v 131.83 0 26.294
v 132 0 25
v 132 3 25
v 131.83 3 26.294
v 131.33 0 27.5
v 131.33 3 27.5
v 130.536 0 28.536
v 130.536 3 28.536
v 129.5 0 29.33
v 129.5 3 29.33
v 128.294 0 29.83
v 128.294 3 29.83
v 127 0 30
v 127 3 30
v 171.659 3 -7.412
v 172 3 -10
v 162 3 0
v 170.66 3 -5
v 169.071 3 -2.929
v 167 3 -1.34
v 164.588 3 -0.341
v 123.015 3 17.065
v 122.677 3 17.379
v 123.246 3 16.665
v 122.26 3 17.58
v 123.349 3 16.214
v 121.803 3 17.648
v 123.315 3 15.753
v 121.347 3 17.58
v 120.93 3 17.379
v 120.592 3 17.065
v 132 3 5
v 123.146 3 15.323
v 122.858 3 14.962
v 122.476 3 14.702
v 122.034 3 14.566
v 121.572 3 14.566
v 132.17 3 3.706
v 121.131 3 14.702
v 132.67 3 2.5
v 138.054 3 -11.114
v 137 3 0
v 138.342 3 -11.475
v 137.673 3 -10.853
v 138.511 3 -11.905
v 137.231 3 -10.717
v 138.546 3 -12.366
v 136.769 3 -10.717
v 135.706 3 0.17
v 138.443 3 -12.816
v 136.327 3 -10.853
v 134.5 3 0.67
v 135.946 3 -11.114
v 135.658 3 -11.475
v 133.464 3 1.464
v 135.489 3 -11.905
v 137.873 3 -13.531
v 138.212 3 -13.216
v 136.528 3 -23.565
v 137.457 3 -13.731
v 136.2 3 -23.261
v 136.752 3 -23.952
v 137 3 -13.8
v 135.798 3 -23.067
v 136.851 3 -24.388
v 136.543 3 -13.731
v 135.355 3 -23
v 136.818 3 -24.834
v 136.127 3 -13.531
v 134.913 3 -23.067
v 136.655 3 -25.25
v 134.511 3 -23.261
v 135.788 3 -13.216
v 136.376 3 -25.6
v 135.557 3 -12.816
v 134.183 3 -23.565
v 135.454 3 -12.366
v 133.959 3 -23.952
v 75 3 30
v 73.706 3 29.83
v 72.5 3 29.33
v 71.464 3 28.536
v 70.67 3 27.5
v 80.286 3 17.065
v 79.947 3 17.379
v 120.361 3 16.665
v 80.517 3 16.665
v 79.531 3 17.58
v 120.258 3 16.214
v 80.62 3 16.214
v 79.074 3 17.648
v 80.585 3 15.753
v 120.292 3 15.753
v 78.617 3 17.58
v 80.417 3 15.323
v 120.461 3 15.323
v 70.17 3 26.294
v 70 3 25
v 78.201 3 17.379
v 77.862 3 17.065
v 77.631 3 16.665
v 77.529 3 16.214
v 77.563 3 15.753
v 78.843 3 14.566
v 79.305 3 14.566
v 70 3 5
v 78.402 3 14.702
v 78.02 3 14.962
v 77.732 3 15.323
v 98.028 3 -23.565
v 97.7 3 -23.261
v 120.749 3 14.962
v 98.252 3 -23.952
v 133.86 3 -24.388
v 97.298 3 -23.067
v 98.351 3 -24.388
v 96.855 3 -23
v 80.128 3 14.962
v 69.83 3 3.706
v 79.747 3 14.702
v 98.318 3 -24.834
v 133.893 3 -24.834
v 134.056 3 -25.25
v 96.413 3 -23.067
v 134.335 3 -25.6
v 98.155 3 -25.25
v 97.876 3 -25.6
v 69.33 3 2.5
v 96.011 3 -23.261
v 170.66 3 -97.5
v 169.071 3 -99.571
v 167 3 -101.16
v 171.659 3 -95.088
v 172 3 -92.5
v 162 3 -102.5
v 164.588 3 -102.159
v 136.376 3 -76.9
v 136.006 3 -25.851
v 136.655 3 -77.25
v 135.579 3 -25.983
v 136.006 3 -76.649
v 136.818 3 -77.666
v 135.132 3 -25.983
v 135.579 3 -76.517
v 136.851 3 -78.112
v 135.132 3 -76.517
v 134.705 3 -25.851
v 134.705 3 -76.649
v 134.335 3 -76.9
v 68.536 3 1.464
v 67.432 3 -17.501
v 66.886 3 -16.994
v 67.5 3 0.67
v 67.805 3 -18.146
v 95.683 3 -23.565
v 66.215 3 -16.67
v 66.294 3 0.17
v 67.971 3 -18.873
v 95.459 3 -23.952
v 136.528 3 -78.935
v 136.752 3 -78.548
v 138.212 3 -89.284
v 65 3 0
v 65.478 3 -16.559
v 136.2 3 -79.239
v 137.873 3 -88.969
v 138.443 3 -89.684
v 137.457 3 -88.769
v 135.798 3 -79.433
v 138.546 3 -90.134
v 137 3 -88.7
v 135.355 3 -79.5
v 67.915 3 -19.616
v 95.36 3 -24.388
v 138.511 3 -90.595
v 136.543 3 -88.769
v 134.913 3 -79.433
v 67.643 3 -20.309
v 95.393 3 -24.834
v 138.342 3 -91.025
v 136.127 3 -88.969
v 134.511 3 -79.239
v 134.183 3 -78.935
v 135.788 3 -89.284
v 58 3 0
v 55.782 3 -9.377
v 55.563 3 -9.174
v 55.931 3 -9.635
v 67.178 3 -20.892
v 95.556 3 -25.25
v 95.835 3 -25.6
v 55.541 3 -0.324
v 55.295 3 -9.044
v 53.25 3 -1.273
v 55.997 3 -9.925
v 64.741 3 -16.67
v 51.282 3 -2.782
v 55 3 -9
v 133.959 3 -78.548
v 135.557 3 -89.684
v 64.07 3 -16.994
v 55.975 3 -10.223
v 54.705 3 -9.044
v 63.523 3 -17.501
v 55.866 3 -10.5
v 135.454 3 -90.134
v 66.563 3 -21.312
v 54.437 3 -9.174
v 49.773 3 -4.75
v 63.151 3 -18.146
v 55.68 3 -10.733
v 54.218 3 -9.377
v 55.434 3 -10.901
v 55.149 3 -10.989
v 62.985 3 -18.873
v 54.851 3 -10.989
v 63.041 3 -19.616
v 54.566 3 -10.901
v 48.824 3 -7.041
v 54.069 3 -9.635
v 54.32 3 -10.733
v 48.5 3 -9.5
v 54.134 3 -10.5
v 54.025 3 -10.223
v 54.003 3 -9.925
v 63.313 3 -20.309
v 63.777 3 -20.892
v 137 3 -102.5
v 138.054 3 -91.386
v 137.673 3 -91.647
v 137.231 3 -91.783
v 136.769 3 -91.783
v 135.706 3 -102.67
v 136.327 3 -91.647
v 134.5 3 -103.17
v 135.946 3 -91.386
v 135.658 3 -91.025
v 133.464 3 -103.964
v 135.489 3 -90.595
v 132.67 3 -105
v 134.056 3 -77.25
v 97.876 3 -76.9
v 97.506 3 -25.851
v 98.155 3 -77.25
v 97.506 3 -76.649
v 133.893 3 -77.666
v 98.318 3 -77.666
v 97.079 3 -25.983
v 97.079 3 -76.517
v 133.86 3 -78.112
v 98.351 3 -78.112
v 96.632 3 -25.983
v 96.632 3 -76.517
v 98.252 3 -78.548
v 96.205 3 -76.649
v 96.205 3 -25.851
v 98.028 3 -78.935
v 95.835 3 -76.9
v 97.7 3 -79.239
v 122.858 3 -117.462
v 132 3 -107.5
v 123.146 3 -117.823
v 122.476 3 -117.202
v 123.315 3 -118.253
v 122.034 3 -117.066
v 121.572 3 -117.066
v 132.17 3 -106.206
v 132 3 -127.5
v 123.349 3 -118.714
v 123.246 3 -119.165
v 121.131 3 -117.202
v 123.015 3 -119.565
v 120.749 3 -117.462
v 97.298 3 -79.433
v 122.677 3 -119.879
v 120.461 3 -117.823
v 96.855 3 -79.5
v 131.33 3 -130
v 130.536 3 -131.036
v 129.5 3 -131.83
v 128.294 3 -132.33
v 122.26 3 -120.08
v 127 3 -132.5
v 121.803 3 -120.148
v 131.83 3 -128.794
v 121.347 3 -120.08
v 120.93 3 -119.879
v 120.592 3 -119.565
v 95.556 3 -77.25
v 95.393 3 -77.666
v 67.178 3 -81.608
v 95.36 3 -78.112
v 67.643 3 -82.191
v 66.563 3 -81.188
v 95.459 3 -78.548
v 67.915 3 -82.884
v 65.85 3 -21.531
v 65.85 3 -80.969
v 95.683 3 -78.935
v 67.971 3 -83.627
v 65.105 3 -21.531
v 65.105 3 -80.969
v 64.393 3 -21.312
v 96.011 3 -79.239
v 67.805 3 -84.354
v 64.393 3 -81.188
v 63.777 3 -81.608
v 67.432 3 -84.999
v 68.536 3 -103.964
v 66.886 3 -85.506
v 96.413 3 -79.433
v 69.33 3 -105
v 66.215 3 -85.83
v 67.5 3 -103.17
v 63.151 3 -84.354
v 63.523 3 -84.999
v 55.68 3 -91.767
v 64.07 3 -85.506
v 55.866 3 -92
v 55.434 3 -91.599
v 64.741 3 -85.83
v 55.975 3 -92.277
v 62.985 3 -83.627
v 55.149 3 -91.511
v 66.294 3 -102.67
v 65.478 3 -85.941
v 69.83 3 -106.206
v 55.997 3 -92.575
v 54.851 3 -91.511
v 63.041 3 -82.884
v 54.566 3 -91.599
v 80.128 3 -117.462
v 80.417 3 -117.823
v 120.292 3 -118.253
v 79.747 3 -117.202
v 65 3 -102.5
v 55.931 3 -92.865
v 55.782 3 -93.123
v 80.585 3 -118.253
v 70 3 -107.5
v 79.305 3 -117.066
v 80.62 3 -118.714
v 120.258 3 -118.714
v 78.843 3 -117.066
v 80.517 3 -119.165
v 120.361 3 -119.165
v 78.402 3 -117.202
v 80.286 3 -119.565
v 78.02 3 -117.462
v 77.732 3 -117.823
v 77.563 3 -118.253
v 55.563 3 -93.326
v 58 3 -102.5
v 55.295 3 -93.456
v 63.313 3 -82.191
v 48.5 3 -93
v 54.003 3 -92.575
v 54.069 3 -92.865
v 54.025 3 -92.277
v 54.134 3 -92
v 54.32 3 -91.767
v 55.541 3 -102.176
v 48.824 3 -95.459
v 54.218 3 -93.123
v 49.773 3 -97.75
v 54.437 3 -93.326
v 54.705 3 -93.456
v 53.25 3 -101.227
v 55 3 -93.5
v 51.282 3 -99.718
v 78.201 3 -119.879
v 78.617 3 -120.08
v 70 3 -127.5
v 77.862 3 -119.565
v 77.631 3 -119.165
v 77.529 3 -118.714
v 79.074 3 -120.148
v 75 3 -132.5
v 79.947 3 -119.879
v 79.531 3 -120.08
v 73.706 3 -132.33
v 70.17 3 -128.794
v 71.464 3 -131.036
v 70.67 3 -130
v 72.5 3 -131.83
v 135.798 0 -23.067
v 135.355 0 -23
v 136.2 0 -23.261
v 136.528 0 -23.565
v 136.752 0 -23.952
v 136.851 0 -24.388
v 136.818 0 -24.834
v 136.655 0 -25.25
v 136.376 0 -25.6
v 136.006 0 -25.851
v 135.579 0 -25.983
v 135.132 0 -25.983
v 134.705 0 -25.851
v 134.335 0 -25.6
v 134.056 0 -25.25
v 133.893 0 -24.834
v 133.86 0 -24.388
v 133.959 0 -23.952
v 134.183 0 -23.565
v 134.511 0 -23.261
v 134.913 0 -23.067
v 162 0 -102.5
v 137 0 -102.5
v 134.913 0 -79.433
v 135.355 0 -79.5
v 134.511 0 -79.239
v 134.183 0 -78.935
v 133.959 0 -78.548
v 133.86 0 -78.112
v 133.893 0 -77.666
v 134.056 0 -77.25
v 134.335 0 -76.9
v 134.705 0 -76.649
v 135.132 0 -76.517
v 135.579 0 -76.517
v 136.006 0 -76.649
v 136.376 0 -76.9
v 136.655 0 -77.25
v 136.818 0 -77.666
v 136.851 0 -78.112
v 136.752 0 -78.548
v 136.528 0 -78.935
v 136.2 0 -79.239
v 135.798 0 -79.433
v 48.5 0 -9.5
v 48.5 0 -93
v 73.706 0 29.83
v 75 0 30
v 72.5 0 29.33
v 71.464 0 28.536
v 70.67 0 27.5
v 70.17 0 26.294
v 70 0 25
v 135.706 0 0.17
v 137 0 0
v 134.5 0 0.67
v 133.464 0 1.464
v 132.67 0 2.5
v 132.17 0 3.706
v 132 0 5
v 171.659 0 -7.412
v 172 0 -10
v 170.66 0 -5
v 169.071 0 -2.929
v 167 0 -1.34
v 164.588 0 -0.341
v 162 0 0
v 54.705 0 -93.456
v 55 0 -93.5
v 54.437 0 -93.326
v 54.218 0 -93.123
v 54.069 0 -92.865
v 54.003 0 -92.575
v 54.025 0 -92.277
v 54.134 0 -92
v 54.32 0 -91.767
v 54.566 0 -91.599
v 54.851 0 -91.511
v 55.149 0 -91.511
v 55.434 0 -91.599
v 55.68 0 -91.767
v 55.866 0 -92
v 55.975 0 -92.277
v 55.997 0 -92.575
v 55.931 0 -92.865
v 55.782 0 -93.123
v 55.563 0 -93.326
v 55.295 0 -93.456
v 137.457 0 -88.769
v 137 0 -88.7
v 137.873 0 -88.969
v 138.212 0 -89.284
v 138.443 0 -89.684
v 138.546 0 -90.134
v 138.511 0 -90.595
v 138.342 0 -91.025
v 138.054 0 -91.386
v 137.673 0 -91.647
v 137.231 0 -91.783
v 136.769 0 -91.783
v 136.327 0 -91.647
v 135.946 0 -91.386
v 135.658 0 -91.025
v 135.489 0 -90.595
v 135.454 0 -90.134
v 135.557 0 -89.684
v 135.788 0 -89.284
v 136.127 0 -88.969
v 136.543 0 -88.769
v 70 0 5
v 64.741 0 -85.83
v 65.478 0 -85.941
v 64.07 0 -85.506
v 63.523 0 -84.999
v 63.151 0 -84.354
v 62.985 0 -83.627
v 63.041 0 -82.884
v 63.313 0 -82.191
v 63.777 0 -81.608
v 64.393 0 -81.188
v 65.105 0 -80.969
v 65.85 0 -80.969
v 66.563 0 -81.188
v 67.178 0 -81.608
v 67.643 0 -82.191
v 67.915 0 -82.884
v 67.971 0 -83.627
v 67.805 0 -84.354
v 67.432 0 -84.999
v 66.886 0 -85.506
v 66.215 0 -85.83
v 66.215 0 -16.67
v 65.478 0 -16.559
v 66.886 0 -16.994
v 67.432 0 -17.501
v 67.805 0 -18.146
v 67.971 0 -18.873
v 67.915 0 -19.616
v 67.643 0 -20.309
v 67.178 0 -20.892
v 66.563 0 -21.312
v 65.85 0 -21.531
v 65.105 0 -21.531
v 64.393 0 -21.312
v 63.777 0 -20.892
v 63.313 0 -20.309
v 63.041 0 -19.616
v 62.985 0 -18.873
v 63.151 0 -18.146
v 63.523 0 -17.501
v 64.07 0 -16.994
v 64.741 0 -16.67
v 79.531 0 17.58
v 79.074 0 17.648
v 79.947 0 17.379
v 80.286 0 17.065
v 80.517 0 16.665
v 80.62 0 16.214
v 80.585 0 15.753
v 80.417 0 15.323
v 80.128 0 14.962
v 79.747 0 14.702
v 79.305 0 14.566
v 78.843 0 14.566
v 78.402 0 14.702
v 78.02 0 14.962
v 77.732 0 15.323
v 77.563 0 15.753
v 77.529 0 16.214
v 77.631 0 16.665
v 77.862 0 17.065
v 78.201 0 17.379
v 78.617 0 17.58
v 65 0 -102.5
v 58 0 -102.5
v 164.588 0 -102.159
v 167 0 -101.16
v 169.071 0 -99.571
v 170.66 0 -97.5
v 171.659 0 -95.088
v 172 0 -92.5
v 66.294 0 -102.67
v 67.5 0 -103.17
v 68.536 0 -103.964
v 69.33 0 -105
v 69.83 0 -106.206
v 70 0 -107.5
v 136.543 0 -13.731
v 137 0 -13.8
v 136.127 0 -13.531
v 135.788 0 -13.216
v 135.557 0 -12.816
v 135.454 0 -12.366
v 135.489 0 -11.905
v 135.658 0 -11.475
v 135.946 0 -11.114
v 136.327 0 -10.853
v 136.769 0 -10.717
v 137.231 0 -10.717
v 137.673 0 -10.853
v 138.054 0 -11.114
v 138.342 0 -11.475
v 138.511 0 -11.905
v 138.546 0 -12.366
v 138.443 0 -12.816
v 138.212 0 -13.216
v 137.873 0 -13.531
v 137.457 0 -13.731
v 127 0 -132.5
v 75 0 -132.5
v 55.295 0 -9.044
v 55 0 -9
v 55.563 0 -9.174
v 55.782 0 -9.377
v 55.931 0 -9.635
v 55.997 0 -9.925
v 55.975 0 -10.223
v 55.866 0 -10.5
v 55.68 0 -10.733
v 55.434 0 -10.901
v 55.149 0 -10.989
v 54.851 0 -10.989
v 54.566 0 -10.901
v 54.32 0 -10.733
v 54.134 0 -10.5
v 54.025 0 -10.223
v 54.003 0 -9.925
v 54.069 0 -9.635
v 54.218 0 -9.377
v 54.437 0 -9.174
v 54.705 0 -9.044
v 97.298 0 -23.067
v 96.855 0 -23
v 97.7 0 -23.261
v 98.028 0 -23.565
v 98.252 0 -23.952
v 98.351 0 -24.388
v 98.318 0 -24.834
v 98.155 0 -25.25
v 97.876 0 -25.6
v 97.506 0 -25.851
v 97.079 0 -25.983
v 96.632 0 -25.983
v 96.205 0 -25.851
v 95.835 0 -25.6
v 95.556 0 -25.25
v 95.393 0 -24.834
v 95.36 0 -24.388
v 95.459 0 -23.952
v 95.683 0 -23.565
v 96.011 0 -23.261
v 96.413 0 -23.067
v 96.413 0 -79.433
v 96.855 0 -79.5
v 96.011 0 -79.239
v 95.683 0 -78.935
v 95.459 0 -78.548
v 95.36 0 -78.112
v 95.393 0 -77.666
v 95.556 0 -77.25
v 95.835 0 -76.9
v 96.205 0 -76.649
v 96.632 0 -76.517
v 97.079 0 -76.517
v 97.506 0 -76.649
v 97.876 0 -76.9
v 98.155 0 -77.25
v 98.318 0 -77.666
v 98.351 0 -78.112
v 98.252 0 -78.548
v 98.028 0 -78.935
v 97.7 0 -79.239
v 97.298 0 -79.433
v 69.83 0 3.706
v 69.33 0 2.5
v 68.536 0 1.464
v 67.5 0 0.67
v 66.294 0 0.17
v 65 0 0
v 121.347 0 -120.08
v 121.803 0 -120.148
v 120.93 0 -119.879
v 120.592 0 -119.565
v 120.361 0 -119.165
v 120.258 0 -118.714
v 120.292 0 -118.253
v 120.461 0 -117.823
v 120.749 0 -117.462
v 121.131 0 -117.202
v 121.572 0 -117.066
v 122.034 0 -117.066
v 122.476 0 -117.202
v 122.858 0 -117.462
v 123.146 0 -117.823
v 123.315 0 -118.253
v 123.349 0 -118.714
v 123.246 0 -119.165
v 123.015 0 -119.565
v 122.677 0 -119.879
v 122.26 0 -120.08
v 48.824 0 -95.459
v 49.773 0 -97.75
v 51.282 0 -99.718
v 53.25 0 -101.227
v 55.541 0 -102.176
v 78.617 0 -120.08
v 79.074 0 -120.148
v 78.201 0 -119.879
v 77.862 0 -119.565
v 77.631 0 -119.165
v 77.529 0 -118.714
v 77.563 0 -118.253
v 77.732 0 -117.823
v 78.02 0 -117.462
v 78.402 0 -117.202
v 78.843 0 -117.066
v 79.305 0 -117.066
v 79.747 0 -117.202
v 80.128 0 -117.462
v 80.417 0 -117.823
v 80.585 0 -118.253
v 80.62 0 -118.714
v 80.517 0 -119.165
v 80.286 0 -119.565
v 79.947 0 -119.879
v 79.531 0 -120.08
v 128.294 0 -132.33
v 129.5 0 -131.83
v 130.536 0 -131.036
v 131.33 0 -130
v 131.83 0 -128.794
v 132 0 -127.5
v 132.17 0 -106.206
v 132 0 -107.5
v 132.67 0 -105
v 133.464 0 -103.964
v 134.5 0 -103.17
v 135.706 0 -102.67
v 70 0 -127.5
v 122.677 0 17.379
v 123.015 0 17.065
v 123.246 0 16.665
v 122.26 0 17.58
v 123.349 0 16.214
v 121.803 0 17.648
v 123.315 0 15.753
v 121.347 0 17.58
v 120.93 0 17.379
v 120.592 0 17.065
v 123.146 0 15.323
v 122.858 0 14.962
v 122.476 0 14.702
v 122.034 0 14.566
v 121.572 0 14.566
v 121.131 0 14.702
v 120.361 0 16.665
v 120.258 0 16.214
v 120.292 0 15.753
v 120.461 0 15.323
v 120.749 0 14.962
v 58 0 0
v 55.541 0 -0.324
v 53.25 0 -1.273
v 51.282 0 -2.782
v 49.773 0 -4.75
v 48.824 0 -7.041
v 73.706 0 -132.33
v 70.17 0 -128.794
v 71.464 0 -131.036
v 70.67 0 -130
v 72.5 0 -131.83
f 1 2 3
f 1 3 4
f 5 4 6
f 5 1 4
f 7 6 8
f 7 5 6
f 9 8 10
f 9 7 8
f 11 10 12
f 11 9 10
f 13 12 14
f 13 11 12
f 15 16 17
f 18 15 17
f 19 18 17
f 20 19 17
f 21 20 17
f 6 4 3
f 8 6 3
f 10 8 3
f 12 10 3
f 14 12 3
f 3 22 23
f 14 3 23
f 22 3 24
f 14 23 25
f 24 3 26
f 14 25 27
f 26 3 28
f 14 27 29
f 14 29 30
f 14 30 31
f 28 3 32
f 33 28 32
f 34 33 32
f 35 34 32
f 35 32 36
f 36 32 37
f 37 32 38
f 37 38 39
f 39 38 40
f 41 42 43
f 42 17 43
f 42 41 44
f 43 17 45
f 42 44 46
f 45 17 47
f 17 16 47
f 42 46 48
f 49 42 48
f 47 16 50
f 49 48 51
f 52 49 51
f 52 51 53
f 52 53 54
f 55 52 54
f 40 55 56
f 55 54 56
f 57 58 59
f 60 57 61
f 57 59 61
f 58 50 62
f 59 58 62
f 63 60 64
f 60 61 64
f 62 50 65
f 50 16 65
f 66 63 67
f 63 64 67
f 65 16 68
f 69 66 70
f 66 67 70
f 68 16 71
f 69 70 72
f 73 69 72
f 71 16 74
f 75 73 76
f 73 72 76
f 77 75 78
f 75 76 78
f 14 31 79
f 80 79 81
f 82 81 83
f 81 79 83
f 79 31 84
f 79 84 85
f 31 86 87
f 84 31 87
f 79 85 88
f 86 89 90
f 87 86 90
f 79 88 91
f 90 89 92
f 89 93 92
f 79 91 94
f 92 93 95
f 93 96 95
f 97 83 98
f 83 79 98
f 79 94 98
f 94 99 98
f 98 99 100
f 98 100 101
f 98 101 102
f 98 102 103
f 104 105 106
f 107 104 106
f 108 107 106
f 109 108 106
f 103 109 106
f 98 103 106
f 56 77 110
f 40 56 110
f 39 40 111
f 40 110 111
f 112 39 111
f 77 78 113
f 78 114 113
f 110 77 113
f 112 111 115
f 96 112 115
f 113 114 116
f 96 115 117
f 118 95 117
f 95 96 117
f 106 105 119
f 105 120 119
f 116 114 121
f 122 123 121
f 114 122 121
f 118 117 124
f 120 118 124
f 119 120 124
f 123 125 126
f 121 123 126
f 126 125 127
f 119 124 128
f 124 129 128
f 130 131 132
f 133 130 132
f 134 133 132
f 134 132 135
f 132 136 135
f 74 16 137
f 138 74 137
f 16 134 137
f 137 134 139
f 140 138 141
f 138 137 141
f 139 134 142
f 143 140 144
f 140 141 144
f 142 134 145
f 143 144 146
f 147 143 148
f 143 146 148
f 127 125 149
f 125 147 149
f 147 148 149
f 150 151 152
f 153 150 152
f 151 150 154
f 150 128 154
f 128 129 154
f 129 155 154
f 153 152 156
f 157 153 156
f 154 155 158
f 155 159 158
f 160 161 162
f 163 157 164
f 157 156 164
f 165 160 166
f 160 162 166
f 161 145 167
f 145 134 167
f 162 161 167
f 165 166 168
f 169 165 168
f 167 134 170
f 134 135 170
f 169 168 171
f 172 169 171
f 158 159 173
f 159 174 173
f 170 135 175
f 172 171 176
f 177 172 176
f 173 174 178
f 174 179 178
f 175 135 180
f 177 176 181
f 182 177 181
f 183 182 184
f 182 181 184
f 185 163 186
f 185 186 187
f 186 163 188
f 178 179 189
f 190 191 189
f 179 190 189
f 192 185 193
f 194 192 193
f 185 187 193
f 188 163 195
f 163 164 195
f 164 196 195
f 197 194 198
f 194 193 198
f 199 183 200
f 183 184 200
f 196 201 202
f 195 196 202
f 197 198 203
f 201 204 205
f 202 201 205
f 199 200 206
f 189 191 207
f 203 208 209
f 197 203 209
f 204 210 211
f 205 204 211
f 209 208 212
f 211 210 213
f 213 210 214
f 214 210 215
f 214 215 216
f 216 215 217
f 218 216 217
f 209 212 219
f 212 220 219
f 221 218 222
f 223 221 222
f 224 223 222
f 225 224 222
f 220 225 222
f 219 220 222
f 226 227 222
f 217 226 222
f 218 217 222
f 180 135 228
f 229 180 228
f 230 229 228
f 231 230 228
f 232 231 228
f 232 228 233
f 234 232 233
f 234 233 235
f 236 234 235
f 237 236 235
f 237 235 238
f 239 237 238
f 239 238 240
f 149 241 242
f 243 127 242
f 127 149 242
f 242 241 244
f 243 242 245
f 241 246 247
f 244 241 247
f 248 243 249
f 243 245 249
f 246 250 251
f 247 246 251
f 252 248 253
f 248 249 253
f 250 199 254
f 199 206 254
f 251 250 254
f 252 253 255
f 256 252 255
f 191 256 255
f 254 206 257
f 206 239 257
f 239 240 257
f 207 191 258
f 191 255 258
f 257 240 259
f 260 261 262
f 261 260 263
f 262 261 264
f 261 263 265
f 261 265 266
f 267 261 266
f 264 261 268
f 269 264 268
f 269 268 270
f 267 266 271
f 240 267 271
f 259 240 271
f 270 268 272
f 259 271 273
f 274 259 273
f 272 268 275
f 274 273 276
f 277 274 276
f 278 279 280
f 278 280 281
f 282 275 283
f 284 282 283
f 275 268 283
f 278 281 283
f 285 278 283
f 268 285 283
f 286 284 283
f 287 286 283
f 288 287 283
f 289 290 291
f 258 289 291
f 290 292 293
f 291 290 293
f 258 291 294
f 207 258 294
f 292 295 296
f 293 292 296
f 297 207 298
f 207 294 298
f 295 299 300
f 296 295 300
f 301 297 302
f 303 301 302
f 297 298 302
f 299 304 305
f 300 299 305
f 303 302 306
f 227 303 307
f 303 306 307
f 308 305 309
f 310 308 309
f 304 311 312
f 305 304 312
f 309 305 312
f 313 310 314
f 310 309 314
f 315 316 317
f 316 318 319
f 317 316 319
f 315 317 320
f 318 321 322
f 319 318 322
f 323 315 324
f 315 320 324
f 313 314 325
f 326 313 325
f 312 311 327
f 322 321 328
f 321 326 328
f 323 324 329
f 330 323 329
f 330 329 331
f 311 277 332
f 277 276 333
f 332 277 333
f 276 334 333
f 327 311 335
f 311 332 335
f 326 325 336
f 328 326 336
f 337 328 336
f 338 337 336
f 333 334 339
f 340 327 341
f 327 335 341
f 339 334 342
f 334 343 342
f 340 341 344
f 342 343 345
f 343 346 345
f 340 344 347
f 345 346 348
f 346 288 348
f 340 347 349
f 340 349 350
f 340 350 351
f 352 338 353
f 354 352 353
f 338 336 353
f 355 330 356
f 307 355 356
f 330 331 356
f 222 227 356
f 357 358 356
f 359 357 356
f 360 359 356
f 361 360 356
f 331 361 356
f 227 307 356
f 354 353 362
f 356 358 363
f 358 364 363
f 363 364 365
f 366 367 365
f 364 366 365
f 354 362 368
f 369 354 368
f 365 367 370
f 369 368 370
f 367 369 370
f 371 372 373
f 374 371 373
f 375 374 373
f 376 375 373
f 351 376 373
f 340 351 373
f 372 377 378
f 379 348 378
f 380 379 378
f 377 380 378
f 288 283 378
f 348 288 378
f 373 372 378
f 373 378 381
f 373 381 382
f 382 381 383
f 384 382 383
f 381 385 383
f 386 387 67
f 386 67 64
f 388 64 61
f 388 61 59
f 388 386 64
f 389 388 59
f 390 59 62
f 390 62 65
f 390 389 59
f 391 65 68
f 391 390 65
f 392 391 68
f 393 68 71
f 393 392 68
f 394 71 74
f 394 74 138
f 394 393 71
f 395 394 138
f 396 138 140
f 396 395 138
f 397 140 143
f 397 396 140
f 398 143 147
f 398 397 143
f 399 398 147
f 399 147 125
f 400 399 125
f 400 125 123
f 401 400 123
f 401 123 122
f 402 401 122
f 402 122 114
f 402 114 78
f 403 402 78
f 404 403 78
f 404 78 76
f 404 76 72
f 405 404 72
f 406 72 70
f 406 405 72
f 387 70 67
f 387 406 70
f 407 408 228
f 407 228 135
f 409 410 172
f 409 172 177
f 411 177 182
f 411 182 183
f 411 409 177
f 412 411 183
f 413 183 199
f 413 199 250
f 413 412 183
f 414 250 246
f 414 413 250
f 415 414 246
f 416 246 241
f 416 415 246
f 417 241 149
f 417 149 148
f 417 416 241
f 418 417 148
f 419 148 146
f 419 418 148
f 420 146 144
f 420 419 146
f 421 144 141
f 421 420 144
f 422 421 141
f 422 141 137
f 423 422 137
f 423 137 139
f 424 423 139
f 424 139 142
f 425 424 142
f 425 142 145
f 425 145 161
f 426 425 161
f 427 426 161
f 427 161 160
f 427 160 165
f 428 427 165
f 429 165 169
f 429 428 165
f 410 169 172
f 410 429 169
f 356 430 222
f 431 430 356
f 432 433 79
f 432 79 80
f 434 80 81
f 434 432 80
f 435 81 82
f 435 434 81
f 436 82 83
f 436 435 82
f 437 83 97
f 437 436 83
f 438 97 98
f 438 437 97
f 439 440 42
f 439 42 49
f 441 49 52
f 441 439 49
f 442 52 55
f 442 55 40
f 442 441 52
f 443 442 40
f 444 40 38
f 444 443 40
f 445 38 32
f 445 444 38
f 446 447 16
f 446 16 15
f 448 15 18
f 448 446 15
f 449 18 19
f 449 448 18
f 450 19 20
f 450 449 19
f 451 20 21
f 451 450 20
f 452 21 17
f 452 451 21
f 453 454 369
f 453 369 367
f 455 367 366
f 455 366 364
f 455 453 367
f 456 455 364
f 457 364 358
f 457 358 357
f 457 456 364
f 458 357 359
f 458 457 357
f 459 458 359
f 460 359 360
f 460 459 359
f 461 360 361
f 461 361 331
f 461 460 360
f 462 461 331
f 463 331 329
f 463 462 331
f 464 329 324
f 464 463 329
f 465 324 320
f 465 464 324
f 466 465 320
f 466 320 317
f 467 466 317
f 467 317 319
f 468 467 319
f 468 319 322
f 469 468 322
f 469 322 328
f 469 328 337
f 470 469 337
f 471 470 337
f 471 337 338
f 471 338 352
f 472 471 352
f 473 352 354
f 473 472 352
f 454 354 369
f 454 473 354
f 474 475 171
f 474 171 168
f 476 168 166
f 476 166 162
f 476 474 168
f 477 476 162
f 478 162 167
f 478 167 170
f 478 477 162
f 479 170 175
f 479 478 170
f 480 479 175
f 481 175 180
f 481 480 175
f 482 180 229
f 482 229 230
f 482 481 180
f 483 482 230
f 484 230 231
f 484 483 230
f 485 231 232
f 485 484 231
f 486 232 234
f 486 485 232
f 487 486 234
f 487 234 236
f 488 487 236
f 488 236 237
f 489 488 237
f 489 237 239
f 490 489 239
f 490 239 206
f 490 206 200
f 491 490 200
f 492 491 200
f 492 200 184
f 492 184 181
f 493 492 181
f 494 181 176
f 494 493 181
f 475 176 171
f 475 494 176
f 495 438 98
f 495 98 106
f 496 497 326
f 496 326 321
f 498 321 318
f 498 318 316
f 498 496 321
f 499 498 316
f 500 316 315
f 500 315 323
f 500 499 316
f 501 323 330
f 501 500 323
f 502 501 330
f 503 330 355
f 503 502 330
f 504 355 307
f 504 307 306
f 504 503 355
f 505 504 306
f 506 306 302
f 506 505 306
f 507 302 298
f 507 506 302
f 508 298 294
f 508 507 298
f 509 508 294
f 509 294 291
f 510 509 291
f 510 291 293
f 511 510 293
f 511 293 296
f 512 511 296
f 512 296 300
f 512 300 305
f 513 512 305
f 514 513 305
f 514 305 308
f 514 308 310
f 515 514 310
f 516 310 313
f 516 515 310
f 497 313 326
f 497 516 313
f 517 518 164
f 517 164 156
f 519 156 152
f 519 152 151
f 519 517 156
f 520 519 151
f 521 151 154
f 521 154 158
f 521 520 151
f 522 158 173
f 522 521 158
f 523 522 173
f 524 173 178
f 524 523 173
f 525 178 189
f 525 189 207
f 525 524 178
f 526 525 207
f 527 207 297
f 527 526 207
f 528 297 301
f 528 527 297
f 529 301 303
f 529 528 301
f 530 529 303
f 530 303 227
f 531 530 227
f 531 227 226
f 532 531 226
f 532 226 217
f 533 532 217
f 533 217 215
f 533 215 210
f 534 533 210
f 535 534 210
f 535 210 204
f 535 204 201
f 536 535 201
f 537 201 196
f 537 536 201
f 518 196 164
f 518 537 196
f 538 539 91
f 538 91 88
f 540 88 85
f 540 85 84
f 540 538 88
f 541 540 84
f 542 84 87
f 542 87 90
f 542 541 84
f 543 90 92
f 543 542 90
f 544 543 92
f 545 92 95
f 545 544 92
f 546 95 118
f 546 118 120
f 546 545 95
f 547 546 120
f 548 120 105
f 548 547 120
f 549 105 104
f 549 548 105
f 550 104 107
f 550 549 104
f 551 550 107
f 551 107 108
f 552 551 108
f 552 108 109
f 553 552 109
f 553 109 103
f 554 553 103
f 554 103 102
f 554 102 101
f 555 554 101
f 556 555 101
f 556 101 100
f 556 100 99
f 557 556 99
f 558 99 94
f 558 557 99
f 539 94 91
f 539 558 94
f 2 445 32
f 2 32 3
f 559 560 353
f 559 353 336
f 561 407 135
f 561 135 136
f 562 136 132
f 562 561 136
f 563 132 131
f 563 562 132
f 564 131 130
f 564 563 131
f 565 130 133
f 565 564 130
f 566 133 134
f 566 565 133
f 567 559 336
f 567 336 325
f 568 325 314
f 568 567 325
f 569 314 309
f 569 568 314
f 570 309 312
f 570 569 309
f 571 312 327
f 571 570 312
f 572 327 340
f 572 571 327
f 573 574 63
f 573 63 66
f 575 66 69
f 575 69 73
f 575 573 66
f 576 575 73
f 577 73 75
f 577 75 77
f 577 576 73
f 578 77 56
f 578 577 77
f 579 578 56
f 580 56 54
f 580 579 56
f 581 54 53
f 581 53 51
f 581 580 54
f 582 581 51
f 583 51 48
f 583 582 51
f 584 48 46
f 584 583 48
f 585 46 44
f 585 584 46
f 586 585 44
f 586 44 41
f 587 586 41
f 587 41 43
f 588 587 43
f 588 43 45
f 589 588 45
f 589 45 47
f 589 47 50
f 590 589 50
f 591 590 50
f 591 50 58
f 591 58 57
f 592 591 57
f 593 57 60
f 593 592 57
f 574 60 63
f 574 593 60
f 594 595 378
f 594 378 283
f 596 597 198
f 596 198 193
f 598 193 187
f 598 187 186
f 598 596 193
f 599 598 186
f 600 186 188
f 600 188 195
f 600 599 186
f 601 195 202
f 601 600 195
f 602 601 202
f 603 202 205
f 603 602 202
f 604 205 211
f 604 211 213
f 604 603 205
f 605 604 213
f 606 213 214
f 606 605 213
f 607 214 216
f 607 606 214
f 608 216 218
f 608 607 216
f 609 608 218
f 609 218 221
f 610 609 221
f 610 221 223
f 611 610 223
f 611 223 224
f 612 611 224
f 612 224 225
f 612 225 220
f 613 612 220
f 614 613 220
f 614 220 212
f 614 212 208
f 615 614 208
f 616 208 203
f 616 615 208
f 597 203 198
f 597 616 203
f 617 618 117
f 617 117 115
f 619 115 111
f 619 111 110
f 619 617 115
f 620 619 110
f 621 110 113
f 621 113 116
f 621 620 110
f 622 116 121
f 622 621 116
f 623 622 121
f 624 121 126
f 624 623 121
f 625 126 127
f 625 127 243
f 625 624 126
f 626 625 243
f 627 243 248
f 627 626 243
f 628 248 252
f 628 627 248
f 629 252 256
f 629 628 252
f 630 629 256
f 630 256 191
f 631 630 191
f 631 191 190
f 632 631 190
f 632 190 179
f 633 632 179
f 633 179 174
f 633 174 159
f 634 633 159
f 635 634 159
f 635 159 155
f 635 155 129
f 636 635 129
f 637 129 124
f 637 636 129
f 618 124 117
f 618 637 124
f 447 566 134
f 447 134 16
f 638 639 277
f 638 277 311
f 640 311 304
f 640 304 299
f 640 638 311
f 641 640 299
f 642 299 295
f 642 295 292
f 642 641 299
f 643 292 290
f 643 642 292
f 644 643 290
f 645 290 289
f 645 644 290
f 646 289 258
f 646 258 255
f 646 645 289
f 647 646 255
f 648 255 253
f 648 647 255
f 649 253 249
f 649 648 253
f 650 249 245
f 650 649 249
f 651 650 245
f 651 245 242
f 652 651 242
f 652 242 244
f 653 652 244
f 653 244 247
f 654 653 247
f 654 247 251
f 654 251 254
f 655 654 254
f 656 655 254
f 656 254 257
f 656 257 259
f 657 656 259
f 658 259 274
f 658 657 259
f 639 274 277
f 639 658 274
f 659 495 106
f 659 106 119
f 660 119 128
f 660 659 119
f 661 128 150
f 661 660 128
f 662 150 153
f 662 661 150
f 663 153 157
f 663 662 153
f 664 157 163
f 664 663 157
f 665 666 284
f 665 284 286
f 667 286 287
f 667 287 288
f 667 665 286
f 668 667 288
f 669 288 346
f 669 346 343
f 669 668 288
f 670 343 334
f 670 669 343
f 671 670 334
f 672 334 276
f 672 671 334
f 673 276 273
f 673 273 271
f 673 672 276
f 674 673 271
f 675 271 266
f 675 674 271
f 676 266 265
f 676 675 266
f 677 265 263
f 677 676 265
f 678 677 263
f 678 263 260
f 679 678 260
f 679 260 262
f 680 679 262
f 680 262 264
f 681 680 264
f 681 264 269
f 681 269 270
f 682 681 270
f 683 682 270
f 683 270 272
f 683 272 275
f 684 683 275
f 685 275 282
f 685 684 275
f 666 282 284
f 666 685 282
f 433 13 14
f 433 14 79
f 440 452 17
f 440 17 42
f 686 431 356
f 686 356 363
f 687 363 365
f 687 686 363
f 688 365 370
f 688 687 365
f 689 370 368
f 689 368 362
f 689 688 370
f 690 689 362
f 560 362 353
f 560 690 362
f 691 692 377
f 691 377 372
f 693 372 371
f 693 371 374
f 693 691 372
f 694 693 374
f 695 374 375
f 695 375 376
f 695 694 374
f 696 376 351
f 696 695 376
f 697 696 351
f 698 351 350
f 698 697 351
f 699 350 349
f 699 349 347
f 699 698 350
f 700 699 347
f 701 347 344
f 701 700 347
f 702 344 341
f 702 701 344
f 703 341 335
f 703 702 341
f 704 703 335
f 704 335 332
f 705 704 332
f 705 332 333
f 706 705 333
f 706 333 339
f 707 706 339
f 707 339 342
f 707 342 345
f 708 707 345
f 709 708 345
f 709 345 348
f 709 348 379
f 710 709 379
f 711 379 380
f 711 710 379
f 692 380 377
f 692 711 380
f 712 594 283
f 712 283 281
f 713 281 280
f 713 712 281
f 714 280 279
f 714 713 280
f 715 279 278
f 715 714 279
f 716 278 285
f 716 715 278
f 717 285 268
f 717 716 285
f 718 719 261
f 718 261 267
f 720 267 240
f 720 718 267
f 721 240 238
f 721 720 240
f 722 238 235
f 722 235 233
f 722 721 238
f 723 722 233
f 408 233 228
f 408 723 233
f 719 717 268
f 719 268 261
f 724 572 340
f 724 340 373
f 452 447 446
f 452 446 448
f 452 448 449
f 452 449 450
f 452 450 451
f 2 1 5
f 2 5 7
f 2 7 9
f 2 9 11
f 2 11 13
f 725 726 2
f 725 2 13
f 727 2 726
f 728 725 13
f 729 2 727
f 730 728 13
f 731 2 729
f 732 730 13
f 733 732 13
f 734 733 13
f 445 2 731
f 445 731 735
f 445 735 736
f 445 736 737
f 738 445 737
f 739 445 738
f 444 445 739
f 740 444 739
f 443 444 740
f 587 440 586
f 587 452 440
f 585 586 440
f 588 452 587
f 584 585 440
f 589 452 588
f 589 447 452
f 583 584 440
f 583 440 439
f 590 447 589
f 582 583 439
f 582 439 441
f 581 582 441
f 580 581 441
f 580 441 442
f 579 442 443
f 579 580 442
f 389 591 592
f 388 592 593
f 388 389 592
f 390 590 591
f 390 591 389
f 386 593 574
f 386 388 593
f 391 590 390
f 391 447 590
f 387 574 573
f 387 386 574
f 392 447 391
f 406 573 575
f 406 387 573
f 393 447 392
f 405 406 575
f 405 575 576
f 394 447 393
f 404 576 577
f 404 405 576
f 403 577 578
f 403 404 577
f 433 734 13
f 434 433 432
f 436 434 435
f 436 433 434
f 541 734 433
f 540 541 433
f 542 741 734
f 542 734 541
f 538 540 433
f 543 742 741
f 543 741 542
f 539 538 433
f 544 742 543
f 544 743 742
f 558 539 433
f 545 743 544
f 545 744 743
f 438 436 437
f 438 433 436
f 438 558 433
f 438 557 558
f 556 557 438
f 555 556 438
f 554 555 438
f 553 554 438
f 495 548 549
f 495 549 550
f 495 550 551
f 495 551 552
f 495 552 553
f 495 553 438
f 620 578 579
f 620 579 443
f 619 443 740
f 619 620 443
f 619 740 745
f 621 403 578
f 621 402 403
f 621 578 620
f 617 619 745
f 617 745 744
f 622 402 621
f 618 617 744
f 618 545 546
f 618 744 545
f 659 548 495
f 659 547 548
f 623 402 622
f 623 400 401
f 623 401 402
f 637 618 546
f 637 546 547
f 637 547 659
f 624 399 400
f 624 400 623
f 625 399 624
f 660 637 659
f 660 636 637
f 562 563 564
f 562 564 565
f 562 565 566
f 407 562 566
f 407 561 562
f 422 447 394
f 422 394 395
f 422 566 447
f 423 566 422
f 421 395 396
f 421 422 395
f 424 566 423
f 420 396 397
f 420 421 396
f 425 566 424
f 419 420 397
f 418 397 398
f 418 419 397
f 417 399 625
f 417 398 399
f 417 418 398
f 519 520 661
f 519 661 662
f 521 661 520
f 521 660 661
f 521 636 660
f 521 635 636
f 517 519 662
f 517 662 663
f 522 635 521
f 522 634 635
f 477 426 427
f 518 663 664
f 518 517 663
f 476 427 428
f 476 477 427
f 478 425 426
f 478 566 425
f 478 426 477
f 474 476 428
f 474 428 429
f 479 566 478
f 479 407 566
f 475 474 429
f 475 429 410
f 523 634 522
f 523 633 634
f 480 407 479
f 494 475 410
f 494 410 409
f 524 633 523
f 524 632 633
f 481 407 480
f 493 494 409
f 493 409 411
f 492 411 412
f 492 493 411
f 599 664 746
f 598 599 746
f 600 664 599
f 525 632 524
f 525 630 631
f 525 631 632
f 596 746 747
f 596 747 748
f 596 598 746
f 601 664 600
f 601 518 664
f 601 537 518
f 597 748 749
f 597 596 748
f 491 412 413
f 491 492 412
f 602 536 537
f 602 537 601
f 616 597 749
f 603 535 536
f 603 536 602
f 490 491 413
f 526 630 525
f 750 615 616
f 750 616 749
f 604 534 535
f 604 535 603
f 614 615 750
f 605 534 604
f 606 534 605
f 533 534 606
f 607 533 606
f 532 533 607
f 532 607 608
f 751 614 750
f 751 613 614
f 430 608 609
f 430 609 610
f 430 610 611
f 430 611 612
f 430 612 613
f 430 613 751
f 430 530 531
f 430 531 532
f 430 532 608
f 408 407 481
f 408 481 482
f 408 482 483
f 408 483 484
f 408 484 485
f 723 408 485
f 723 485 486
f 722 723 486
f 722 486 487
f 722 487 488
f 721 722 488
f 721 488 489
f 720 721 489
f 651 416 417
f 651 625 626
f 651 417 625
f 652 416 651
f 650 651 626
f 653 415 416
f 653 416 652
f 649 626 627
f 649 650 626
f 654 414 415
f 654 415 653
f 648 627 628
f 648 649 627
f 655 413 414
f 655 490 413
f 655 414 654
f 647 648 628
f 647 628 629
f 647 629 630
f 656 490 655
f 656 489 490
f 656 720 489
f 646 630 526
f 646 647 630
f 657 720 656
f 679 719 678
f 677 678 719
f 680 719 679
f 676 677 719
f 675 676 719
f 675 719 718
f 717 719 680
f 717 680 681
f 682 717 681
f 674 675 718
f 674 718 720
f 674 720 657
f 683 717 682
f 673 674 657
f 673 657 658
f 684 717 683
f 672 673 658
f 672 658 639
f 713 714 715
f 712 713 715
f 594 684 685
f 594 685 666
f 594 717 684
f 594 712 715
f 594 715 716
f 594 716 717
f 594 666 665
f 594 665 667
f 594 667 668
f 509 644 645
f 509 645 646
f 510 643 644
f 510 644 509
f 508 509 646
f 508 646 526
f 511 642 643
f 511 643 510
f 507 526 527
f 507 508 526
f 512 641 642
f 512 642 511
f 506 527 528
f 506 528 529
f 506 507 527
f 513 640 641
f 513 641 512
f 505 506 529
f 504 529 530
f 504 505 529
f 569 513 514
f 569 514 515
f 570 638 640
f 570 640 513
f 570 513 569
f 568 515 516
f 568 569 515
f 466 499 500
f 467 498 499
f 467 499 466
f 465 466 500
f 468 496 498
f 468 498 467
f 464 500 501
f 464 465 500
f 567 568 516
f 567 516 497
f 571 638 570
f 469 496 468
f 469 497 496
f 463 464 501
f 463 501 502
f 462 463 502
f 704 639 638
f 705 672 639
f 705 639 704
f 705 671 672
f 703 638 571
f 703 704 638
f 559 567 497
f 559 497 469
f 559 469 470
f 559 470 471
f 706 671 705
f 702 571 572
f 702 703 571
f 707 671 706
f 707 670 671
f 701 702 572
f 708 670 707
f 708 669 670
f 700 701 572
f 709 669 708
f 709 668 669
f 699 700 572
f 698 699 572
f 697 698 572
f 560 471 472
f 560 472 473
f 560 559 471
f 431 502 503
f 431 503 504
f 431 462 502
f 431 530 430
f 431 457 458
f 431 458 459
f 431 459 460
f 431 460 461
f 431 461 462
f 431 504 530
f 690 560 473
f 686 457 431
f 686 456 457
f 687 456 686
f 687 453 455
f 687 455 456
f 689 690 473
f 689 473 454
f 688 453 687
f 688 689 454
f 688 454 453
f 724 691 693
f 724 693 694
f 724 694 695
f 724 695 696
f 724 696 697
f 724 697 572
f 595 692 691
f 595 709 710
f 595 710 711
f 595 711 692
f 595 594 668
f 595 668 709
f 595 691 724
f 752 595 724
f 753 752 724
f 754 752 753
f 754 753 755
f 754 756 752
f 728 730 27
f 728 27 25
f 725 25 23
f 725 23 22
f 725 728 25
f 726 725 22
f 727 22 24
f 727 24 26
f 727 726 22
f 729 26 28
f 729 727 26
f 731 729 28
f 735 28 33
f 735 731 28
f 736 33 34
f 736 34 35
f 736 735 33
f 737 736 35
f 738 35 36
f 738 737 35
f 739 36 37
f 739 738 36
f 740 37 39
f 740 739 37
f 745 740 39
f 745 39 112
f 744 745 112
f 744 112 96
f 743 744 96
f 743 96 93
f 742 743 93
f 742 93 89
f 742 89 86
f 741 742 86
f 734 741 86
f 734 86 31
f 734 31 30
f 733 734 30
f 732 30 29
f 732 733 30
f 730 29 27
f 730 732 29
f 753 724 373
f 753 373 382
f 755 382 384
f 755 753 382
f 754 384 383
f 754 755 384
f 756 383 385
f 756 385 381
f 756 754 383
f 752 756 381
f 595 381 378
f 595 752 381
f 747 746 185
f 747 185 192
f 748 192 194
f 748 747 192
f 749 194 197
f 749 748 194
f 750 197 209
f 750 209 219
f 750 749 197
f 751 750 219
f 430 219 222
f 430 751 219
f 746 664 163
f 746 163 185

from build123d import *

# Parameters (mm, degrees)
SKETCH_1_R      = 1.5
SKETCH_1_R_2    = 2.5
SKETCH_1_R_3    = 1.55
SKETCH_1_R_4    = 1
EXTRUDE_1_DEPTH = 3


with BuildPart() as part:
    # 草图1 → 凸台-拉伸1 (new body)
    with BuildSketch(Plane(origin=(0, 0, 0), x_dir=(1, 0, 0), z_dir=(0, 1, 0))):
        with BuildLine():
            Line((132, -5), (132, -25))
            ThreePointArc((132, -25), (130.535533906, -28.535533906), (127, -30))
            Line((127, -30), (75, -30))
            ThreePointArc((75, -30), (71.464466094, -28.535533906), (70, -25))
            Line((70, -25), (70, -5))
            ThreePointArc((70, -5), (68.535533906, -1.464466094), (65, 0))
            Line((65, 0), (58, 0))
            ThreePointArc((58, 0), (51.282485579, 2.782485579), (48.5, 9.5))
            Line((48.5, 9.5), (48.5, 93))
            ThreePointArc((48.5, 93), (51.282485579, 99.717514421), (58, 102.5))
            Line((58, 102.5), (65, 102.5))
            ThreePointArc((65, 102.5), (68.535533906, 103.964466094), (70, 107.5))
            Line((70, 107.5), (70, 127.5))
            ThreePointArc((70, 127.5), (71.464466094, 131.035533906), (75, 132.5))
            Line((75, 132.5), (127, 132.5))
            ThreePointArc((127, 132.5), (130.535533906, 131.035533906), (132, 127.5))
            Line((132, 127.5), (132, 107.5))
            ThreePointArc((132, 107.5), (133.464466094, 103.964466094), (137, 102.5))
            Line((137, 102.5), (162, 102.5))
            ThreePointArc((162, 102.5), (169.071067812, 99.571067812), (172, 92.5))
            Line((172, 92.5), (172, 10))
            ThreePointArc((172, 10), (169.071067812, 2.928932188), (162, 0))
            Line((162, 0), (137, 0))
            ThreePointArc((137, 0), (133.464466094, -1.464466094), (132, -5))
        make_face()
        with Locations(Location((96.855482095, 24.5, 0), (0, 0, 270))):
            Circle(SKETCH_1_R, mode=Mode.SUBTRACT)
        with Locations(Location((135.355482095, 24.5, 0), (0, 0, 270))):
            Circle(SKETCH_1_R, mode=Mode.SUBTRACT)
        with Locations(Location((65.477875917, 19.059382071, 0), (0, 0, 270))):
            Circle(SKETCH_1_R_2, mode=Mode.SUBTRACT)
        with Locations(Location((79.074216313, -16.098364995, 0), (0, 0, 270))):
            Circle(SKETCH_1_R_3, mode=Mode.SUBTRACT)
        with Locations(Location((121.803446989, -16.098364995, 0), (0, 0, 270))):
            Circle(SKETCH_1_R_3, mode=Mode.SUBTRACT)
        with Locations(Location((135.355482095, 78, 0), (0, 0, 90))):
            Circle(SKETCH_1_R, mode=Mode.SUBTRACT)
        with Locations(Location((96.855482095, 78, 0), (0, 0, 90))):
            Circle(SKETCH_1_R, mode=Mode.SUBTRACT)
        with Locations(Location((65.477875917, 83.440617929, 0), (0, 0, 90))):
            Circle(SKETCH_1_R_2, mode=Mode.SUBTRACT)
        with Locations(Location((55, 10, 0), (0, 0, 270))):
            Circle(SKETCH_1_R_4, mode=Mode.SUBTRACT)
        with Locations(Location((55, 92.5, 0), (0, 0, 90))):
            Circle(SKETCH_1_R_4, mode=Mode.SUBTRACT)
        with Locations(Location((121.803446989, 118.598364995, 0), (0, 0, 90))):
            Circle(SKETCH_1_R_3, mode=Mode.SUBTRACT)
        with Locations(Location((79.074216313, 118.598364995, 0), (0, 0, 90))):
            Circle(SKETCH_1_R_3, mode=Mode.SUBTRACT)
        with Locations(Location((137, 90.25, 0), (0, 0, 270))):
            Circle(SKETCH_1_R_3, mode=Mode.SUBTRACT)
        with Locations(Location((137, 12.25, 0), (0, 0, 90))):
            Circle(SKETCH_1_R_3, mode=Mode.SUBTRACT)
    extrude(amount=EXTRUDE_1_DEPTH)


solid = part.part
